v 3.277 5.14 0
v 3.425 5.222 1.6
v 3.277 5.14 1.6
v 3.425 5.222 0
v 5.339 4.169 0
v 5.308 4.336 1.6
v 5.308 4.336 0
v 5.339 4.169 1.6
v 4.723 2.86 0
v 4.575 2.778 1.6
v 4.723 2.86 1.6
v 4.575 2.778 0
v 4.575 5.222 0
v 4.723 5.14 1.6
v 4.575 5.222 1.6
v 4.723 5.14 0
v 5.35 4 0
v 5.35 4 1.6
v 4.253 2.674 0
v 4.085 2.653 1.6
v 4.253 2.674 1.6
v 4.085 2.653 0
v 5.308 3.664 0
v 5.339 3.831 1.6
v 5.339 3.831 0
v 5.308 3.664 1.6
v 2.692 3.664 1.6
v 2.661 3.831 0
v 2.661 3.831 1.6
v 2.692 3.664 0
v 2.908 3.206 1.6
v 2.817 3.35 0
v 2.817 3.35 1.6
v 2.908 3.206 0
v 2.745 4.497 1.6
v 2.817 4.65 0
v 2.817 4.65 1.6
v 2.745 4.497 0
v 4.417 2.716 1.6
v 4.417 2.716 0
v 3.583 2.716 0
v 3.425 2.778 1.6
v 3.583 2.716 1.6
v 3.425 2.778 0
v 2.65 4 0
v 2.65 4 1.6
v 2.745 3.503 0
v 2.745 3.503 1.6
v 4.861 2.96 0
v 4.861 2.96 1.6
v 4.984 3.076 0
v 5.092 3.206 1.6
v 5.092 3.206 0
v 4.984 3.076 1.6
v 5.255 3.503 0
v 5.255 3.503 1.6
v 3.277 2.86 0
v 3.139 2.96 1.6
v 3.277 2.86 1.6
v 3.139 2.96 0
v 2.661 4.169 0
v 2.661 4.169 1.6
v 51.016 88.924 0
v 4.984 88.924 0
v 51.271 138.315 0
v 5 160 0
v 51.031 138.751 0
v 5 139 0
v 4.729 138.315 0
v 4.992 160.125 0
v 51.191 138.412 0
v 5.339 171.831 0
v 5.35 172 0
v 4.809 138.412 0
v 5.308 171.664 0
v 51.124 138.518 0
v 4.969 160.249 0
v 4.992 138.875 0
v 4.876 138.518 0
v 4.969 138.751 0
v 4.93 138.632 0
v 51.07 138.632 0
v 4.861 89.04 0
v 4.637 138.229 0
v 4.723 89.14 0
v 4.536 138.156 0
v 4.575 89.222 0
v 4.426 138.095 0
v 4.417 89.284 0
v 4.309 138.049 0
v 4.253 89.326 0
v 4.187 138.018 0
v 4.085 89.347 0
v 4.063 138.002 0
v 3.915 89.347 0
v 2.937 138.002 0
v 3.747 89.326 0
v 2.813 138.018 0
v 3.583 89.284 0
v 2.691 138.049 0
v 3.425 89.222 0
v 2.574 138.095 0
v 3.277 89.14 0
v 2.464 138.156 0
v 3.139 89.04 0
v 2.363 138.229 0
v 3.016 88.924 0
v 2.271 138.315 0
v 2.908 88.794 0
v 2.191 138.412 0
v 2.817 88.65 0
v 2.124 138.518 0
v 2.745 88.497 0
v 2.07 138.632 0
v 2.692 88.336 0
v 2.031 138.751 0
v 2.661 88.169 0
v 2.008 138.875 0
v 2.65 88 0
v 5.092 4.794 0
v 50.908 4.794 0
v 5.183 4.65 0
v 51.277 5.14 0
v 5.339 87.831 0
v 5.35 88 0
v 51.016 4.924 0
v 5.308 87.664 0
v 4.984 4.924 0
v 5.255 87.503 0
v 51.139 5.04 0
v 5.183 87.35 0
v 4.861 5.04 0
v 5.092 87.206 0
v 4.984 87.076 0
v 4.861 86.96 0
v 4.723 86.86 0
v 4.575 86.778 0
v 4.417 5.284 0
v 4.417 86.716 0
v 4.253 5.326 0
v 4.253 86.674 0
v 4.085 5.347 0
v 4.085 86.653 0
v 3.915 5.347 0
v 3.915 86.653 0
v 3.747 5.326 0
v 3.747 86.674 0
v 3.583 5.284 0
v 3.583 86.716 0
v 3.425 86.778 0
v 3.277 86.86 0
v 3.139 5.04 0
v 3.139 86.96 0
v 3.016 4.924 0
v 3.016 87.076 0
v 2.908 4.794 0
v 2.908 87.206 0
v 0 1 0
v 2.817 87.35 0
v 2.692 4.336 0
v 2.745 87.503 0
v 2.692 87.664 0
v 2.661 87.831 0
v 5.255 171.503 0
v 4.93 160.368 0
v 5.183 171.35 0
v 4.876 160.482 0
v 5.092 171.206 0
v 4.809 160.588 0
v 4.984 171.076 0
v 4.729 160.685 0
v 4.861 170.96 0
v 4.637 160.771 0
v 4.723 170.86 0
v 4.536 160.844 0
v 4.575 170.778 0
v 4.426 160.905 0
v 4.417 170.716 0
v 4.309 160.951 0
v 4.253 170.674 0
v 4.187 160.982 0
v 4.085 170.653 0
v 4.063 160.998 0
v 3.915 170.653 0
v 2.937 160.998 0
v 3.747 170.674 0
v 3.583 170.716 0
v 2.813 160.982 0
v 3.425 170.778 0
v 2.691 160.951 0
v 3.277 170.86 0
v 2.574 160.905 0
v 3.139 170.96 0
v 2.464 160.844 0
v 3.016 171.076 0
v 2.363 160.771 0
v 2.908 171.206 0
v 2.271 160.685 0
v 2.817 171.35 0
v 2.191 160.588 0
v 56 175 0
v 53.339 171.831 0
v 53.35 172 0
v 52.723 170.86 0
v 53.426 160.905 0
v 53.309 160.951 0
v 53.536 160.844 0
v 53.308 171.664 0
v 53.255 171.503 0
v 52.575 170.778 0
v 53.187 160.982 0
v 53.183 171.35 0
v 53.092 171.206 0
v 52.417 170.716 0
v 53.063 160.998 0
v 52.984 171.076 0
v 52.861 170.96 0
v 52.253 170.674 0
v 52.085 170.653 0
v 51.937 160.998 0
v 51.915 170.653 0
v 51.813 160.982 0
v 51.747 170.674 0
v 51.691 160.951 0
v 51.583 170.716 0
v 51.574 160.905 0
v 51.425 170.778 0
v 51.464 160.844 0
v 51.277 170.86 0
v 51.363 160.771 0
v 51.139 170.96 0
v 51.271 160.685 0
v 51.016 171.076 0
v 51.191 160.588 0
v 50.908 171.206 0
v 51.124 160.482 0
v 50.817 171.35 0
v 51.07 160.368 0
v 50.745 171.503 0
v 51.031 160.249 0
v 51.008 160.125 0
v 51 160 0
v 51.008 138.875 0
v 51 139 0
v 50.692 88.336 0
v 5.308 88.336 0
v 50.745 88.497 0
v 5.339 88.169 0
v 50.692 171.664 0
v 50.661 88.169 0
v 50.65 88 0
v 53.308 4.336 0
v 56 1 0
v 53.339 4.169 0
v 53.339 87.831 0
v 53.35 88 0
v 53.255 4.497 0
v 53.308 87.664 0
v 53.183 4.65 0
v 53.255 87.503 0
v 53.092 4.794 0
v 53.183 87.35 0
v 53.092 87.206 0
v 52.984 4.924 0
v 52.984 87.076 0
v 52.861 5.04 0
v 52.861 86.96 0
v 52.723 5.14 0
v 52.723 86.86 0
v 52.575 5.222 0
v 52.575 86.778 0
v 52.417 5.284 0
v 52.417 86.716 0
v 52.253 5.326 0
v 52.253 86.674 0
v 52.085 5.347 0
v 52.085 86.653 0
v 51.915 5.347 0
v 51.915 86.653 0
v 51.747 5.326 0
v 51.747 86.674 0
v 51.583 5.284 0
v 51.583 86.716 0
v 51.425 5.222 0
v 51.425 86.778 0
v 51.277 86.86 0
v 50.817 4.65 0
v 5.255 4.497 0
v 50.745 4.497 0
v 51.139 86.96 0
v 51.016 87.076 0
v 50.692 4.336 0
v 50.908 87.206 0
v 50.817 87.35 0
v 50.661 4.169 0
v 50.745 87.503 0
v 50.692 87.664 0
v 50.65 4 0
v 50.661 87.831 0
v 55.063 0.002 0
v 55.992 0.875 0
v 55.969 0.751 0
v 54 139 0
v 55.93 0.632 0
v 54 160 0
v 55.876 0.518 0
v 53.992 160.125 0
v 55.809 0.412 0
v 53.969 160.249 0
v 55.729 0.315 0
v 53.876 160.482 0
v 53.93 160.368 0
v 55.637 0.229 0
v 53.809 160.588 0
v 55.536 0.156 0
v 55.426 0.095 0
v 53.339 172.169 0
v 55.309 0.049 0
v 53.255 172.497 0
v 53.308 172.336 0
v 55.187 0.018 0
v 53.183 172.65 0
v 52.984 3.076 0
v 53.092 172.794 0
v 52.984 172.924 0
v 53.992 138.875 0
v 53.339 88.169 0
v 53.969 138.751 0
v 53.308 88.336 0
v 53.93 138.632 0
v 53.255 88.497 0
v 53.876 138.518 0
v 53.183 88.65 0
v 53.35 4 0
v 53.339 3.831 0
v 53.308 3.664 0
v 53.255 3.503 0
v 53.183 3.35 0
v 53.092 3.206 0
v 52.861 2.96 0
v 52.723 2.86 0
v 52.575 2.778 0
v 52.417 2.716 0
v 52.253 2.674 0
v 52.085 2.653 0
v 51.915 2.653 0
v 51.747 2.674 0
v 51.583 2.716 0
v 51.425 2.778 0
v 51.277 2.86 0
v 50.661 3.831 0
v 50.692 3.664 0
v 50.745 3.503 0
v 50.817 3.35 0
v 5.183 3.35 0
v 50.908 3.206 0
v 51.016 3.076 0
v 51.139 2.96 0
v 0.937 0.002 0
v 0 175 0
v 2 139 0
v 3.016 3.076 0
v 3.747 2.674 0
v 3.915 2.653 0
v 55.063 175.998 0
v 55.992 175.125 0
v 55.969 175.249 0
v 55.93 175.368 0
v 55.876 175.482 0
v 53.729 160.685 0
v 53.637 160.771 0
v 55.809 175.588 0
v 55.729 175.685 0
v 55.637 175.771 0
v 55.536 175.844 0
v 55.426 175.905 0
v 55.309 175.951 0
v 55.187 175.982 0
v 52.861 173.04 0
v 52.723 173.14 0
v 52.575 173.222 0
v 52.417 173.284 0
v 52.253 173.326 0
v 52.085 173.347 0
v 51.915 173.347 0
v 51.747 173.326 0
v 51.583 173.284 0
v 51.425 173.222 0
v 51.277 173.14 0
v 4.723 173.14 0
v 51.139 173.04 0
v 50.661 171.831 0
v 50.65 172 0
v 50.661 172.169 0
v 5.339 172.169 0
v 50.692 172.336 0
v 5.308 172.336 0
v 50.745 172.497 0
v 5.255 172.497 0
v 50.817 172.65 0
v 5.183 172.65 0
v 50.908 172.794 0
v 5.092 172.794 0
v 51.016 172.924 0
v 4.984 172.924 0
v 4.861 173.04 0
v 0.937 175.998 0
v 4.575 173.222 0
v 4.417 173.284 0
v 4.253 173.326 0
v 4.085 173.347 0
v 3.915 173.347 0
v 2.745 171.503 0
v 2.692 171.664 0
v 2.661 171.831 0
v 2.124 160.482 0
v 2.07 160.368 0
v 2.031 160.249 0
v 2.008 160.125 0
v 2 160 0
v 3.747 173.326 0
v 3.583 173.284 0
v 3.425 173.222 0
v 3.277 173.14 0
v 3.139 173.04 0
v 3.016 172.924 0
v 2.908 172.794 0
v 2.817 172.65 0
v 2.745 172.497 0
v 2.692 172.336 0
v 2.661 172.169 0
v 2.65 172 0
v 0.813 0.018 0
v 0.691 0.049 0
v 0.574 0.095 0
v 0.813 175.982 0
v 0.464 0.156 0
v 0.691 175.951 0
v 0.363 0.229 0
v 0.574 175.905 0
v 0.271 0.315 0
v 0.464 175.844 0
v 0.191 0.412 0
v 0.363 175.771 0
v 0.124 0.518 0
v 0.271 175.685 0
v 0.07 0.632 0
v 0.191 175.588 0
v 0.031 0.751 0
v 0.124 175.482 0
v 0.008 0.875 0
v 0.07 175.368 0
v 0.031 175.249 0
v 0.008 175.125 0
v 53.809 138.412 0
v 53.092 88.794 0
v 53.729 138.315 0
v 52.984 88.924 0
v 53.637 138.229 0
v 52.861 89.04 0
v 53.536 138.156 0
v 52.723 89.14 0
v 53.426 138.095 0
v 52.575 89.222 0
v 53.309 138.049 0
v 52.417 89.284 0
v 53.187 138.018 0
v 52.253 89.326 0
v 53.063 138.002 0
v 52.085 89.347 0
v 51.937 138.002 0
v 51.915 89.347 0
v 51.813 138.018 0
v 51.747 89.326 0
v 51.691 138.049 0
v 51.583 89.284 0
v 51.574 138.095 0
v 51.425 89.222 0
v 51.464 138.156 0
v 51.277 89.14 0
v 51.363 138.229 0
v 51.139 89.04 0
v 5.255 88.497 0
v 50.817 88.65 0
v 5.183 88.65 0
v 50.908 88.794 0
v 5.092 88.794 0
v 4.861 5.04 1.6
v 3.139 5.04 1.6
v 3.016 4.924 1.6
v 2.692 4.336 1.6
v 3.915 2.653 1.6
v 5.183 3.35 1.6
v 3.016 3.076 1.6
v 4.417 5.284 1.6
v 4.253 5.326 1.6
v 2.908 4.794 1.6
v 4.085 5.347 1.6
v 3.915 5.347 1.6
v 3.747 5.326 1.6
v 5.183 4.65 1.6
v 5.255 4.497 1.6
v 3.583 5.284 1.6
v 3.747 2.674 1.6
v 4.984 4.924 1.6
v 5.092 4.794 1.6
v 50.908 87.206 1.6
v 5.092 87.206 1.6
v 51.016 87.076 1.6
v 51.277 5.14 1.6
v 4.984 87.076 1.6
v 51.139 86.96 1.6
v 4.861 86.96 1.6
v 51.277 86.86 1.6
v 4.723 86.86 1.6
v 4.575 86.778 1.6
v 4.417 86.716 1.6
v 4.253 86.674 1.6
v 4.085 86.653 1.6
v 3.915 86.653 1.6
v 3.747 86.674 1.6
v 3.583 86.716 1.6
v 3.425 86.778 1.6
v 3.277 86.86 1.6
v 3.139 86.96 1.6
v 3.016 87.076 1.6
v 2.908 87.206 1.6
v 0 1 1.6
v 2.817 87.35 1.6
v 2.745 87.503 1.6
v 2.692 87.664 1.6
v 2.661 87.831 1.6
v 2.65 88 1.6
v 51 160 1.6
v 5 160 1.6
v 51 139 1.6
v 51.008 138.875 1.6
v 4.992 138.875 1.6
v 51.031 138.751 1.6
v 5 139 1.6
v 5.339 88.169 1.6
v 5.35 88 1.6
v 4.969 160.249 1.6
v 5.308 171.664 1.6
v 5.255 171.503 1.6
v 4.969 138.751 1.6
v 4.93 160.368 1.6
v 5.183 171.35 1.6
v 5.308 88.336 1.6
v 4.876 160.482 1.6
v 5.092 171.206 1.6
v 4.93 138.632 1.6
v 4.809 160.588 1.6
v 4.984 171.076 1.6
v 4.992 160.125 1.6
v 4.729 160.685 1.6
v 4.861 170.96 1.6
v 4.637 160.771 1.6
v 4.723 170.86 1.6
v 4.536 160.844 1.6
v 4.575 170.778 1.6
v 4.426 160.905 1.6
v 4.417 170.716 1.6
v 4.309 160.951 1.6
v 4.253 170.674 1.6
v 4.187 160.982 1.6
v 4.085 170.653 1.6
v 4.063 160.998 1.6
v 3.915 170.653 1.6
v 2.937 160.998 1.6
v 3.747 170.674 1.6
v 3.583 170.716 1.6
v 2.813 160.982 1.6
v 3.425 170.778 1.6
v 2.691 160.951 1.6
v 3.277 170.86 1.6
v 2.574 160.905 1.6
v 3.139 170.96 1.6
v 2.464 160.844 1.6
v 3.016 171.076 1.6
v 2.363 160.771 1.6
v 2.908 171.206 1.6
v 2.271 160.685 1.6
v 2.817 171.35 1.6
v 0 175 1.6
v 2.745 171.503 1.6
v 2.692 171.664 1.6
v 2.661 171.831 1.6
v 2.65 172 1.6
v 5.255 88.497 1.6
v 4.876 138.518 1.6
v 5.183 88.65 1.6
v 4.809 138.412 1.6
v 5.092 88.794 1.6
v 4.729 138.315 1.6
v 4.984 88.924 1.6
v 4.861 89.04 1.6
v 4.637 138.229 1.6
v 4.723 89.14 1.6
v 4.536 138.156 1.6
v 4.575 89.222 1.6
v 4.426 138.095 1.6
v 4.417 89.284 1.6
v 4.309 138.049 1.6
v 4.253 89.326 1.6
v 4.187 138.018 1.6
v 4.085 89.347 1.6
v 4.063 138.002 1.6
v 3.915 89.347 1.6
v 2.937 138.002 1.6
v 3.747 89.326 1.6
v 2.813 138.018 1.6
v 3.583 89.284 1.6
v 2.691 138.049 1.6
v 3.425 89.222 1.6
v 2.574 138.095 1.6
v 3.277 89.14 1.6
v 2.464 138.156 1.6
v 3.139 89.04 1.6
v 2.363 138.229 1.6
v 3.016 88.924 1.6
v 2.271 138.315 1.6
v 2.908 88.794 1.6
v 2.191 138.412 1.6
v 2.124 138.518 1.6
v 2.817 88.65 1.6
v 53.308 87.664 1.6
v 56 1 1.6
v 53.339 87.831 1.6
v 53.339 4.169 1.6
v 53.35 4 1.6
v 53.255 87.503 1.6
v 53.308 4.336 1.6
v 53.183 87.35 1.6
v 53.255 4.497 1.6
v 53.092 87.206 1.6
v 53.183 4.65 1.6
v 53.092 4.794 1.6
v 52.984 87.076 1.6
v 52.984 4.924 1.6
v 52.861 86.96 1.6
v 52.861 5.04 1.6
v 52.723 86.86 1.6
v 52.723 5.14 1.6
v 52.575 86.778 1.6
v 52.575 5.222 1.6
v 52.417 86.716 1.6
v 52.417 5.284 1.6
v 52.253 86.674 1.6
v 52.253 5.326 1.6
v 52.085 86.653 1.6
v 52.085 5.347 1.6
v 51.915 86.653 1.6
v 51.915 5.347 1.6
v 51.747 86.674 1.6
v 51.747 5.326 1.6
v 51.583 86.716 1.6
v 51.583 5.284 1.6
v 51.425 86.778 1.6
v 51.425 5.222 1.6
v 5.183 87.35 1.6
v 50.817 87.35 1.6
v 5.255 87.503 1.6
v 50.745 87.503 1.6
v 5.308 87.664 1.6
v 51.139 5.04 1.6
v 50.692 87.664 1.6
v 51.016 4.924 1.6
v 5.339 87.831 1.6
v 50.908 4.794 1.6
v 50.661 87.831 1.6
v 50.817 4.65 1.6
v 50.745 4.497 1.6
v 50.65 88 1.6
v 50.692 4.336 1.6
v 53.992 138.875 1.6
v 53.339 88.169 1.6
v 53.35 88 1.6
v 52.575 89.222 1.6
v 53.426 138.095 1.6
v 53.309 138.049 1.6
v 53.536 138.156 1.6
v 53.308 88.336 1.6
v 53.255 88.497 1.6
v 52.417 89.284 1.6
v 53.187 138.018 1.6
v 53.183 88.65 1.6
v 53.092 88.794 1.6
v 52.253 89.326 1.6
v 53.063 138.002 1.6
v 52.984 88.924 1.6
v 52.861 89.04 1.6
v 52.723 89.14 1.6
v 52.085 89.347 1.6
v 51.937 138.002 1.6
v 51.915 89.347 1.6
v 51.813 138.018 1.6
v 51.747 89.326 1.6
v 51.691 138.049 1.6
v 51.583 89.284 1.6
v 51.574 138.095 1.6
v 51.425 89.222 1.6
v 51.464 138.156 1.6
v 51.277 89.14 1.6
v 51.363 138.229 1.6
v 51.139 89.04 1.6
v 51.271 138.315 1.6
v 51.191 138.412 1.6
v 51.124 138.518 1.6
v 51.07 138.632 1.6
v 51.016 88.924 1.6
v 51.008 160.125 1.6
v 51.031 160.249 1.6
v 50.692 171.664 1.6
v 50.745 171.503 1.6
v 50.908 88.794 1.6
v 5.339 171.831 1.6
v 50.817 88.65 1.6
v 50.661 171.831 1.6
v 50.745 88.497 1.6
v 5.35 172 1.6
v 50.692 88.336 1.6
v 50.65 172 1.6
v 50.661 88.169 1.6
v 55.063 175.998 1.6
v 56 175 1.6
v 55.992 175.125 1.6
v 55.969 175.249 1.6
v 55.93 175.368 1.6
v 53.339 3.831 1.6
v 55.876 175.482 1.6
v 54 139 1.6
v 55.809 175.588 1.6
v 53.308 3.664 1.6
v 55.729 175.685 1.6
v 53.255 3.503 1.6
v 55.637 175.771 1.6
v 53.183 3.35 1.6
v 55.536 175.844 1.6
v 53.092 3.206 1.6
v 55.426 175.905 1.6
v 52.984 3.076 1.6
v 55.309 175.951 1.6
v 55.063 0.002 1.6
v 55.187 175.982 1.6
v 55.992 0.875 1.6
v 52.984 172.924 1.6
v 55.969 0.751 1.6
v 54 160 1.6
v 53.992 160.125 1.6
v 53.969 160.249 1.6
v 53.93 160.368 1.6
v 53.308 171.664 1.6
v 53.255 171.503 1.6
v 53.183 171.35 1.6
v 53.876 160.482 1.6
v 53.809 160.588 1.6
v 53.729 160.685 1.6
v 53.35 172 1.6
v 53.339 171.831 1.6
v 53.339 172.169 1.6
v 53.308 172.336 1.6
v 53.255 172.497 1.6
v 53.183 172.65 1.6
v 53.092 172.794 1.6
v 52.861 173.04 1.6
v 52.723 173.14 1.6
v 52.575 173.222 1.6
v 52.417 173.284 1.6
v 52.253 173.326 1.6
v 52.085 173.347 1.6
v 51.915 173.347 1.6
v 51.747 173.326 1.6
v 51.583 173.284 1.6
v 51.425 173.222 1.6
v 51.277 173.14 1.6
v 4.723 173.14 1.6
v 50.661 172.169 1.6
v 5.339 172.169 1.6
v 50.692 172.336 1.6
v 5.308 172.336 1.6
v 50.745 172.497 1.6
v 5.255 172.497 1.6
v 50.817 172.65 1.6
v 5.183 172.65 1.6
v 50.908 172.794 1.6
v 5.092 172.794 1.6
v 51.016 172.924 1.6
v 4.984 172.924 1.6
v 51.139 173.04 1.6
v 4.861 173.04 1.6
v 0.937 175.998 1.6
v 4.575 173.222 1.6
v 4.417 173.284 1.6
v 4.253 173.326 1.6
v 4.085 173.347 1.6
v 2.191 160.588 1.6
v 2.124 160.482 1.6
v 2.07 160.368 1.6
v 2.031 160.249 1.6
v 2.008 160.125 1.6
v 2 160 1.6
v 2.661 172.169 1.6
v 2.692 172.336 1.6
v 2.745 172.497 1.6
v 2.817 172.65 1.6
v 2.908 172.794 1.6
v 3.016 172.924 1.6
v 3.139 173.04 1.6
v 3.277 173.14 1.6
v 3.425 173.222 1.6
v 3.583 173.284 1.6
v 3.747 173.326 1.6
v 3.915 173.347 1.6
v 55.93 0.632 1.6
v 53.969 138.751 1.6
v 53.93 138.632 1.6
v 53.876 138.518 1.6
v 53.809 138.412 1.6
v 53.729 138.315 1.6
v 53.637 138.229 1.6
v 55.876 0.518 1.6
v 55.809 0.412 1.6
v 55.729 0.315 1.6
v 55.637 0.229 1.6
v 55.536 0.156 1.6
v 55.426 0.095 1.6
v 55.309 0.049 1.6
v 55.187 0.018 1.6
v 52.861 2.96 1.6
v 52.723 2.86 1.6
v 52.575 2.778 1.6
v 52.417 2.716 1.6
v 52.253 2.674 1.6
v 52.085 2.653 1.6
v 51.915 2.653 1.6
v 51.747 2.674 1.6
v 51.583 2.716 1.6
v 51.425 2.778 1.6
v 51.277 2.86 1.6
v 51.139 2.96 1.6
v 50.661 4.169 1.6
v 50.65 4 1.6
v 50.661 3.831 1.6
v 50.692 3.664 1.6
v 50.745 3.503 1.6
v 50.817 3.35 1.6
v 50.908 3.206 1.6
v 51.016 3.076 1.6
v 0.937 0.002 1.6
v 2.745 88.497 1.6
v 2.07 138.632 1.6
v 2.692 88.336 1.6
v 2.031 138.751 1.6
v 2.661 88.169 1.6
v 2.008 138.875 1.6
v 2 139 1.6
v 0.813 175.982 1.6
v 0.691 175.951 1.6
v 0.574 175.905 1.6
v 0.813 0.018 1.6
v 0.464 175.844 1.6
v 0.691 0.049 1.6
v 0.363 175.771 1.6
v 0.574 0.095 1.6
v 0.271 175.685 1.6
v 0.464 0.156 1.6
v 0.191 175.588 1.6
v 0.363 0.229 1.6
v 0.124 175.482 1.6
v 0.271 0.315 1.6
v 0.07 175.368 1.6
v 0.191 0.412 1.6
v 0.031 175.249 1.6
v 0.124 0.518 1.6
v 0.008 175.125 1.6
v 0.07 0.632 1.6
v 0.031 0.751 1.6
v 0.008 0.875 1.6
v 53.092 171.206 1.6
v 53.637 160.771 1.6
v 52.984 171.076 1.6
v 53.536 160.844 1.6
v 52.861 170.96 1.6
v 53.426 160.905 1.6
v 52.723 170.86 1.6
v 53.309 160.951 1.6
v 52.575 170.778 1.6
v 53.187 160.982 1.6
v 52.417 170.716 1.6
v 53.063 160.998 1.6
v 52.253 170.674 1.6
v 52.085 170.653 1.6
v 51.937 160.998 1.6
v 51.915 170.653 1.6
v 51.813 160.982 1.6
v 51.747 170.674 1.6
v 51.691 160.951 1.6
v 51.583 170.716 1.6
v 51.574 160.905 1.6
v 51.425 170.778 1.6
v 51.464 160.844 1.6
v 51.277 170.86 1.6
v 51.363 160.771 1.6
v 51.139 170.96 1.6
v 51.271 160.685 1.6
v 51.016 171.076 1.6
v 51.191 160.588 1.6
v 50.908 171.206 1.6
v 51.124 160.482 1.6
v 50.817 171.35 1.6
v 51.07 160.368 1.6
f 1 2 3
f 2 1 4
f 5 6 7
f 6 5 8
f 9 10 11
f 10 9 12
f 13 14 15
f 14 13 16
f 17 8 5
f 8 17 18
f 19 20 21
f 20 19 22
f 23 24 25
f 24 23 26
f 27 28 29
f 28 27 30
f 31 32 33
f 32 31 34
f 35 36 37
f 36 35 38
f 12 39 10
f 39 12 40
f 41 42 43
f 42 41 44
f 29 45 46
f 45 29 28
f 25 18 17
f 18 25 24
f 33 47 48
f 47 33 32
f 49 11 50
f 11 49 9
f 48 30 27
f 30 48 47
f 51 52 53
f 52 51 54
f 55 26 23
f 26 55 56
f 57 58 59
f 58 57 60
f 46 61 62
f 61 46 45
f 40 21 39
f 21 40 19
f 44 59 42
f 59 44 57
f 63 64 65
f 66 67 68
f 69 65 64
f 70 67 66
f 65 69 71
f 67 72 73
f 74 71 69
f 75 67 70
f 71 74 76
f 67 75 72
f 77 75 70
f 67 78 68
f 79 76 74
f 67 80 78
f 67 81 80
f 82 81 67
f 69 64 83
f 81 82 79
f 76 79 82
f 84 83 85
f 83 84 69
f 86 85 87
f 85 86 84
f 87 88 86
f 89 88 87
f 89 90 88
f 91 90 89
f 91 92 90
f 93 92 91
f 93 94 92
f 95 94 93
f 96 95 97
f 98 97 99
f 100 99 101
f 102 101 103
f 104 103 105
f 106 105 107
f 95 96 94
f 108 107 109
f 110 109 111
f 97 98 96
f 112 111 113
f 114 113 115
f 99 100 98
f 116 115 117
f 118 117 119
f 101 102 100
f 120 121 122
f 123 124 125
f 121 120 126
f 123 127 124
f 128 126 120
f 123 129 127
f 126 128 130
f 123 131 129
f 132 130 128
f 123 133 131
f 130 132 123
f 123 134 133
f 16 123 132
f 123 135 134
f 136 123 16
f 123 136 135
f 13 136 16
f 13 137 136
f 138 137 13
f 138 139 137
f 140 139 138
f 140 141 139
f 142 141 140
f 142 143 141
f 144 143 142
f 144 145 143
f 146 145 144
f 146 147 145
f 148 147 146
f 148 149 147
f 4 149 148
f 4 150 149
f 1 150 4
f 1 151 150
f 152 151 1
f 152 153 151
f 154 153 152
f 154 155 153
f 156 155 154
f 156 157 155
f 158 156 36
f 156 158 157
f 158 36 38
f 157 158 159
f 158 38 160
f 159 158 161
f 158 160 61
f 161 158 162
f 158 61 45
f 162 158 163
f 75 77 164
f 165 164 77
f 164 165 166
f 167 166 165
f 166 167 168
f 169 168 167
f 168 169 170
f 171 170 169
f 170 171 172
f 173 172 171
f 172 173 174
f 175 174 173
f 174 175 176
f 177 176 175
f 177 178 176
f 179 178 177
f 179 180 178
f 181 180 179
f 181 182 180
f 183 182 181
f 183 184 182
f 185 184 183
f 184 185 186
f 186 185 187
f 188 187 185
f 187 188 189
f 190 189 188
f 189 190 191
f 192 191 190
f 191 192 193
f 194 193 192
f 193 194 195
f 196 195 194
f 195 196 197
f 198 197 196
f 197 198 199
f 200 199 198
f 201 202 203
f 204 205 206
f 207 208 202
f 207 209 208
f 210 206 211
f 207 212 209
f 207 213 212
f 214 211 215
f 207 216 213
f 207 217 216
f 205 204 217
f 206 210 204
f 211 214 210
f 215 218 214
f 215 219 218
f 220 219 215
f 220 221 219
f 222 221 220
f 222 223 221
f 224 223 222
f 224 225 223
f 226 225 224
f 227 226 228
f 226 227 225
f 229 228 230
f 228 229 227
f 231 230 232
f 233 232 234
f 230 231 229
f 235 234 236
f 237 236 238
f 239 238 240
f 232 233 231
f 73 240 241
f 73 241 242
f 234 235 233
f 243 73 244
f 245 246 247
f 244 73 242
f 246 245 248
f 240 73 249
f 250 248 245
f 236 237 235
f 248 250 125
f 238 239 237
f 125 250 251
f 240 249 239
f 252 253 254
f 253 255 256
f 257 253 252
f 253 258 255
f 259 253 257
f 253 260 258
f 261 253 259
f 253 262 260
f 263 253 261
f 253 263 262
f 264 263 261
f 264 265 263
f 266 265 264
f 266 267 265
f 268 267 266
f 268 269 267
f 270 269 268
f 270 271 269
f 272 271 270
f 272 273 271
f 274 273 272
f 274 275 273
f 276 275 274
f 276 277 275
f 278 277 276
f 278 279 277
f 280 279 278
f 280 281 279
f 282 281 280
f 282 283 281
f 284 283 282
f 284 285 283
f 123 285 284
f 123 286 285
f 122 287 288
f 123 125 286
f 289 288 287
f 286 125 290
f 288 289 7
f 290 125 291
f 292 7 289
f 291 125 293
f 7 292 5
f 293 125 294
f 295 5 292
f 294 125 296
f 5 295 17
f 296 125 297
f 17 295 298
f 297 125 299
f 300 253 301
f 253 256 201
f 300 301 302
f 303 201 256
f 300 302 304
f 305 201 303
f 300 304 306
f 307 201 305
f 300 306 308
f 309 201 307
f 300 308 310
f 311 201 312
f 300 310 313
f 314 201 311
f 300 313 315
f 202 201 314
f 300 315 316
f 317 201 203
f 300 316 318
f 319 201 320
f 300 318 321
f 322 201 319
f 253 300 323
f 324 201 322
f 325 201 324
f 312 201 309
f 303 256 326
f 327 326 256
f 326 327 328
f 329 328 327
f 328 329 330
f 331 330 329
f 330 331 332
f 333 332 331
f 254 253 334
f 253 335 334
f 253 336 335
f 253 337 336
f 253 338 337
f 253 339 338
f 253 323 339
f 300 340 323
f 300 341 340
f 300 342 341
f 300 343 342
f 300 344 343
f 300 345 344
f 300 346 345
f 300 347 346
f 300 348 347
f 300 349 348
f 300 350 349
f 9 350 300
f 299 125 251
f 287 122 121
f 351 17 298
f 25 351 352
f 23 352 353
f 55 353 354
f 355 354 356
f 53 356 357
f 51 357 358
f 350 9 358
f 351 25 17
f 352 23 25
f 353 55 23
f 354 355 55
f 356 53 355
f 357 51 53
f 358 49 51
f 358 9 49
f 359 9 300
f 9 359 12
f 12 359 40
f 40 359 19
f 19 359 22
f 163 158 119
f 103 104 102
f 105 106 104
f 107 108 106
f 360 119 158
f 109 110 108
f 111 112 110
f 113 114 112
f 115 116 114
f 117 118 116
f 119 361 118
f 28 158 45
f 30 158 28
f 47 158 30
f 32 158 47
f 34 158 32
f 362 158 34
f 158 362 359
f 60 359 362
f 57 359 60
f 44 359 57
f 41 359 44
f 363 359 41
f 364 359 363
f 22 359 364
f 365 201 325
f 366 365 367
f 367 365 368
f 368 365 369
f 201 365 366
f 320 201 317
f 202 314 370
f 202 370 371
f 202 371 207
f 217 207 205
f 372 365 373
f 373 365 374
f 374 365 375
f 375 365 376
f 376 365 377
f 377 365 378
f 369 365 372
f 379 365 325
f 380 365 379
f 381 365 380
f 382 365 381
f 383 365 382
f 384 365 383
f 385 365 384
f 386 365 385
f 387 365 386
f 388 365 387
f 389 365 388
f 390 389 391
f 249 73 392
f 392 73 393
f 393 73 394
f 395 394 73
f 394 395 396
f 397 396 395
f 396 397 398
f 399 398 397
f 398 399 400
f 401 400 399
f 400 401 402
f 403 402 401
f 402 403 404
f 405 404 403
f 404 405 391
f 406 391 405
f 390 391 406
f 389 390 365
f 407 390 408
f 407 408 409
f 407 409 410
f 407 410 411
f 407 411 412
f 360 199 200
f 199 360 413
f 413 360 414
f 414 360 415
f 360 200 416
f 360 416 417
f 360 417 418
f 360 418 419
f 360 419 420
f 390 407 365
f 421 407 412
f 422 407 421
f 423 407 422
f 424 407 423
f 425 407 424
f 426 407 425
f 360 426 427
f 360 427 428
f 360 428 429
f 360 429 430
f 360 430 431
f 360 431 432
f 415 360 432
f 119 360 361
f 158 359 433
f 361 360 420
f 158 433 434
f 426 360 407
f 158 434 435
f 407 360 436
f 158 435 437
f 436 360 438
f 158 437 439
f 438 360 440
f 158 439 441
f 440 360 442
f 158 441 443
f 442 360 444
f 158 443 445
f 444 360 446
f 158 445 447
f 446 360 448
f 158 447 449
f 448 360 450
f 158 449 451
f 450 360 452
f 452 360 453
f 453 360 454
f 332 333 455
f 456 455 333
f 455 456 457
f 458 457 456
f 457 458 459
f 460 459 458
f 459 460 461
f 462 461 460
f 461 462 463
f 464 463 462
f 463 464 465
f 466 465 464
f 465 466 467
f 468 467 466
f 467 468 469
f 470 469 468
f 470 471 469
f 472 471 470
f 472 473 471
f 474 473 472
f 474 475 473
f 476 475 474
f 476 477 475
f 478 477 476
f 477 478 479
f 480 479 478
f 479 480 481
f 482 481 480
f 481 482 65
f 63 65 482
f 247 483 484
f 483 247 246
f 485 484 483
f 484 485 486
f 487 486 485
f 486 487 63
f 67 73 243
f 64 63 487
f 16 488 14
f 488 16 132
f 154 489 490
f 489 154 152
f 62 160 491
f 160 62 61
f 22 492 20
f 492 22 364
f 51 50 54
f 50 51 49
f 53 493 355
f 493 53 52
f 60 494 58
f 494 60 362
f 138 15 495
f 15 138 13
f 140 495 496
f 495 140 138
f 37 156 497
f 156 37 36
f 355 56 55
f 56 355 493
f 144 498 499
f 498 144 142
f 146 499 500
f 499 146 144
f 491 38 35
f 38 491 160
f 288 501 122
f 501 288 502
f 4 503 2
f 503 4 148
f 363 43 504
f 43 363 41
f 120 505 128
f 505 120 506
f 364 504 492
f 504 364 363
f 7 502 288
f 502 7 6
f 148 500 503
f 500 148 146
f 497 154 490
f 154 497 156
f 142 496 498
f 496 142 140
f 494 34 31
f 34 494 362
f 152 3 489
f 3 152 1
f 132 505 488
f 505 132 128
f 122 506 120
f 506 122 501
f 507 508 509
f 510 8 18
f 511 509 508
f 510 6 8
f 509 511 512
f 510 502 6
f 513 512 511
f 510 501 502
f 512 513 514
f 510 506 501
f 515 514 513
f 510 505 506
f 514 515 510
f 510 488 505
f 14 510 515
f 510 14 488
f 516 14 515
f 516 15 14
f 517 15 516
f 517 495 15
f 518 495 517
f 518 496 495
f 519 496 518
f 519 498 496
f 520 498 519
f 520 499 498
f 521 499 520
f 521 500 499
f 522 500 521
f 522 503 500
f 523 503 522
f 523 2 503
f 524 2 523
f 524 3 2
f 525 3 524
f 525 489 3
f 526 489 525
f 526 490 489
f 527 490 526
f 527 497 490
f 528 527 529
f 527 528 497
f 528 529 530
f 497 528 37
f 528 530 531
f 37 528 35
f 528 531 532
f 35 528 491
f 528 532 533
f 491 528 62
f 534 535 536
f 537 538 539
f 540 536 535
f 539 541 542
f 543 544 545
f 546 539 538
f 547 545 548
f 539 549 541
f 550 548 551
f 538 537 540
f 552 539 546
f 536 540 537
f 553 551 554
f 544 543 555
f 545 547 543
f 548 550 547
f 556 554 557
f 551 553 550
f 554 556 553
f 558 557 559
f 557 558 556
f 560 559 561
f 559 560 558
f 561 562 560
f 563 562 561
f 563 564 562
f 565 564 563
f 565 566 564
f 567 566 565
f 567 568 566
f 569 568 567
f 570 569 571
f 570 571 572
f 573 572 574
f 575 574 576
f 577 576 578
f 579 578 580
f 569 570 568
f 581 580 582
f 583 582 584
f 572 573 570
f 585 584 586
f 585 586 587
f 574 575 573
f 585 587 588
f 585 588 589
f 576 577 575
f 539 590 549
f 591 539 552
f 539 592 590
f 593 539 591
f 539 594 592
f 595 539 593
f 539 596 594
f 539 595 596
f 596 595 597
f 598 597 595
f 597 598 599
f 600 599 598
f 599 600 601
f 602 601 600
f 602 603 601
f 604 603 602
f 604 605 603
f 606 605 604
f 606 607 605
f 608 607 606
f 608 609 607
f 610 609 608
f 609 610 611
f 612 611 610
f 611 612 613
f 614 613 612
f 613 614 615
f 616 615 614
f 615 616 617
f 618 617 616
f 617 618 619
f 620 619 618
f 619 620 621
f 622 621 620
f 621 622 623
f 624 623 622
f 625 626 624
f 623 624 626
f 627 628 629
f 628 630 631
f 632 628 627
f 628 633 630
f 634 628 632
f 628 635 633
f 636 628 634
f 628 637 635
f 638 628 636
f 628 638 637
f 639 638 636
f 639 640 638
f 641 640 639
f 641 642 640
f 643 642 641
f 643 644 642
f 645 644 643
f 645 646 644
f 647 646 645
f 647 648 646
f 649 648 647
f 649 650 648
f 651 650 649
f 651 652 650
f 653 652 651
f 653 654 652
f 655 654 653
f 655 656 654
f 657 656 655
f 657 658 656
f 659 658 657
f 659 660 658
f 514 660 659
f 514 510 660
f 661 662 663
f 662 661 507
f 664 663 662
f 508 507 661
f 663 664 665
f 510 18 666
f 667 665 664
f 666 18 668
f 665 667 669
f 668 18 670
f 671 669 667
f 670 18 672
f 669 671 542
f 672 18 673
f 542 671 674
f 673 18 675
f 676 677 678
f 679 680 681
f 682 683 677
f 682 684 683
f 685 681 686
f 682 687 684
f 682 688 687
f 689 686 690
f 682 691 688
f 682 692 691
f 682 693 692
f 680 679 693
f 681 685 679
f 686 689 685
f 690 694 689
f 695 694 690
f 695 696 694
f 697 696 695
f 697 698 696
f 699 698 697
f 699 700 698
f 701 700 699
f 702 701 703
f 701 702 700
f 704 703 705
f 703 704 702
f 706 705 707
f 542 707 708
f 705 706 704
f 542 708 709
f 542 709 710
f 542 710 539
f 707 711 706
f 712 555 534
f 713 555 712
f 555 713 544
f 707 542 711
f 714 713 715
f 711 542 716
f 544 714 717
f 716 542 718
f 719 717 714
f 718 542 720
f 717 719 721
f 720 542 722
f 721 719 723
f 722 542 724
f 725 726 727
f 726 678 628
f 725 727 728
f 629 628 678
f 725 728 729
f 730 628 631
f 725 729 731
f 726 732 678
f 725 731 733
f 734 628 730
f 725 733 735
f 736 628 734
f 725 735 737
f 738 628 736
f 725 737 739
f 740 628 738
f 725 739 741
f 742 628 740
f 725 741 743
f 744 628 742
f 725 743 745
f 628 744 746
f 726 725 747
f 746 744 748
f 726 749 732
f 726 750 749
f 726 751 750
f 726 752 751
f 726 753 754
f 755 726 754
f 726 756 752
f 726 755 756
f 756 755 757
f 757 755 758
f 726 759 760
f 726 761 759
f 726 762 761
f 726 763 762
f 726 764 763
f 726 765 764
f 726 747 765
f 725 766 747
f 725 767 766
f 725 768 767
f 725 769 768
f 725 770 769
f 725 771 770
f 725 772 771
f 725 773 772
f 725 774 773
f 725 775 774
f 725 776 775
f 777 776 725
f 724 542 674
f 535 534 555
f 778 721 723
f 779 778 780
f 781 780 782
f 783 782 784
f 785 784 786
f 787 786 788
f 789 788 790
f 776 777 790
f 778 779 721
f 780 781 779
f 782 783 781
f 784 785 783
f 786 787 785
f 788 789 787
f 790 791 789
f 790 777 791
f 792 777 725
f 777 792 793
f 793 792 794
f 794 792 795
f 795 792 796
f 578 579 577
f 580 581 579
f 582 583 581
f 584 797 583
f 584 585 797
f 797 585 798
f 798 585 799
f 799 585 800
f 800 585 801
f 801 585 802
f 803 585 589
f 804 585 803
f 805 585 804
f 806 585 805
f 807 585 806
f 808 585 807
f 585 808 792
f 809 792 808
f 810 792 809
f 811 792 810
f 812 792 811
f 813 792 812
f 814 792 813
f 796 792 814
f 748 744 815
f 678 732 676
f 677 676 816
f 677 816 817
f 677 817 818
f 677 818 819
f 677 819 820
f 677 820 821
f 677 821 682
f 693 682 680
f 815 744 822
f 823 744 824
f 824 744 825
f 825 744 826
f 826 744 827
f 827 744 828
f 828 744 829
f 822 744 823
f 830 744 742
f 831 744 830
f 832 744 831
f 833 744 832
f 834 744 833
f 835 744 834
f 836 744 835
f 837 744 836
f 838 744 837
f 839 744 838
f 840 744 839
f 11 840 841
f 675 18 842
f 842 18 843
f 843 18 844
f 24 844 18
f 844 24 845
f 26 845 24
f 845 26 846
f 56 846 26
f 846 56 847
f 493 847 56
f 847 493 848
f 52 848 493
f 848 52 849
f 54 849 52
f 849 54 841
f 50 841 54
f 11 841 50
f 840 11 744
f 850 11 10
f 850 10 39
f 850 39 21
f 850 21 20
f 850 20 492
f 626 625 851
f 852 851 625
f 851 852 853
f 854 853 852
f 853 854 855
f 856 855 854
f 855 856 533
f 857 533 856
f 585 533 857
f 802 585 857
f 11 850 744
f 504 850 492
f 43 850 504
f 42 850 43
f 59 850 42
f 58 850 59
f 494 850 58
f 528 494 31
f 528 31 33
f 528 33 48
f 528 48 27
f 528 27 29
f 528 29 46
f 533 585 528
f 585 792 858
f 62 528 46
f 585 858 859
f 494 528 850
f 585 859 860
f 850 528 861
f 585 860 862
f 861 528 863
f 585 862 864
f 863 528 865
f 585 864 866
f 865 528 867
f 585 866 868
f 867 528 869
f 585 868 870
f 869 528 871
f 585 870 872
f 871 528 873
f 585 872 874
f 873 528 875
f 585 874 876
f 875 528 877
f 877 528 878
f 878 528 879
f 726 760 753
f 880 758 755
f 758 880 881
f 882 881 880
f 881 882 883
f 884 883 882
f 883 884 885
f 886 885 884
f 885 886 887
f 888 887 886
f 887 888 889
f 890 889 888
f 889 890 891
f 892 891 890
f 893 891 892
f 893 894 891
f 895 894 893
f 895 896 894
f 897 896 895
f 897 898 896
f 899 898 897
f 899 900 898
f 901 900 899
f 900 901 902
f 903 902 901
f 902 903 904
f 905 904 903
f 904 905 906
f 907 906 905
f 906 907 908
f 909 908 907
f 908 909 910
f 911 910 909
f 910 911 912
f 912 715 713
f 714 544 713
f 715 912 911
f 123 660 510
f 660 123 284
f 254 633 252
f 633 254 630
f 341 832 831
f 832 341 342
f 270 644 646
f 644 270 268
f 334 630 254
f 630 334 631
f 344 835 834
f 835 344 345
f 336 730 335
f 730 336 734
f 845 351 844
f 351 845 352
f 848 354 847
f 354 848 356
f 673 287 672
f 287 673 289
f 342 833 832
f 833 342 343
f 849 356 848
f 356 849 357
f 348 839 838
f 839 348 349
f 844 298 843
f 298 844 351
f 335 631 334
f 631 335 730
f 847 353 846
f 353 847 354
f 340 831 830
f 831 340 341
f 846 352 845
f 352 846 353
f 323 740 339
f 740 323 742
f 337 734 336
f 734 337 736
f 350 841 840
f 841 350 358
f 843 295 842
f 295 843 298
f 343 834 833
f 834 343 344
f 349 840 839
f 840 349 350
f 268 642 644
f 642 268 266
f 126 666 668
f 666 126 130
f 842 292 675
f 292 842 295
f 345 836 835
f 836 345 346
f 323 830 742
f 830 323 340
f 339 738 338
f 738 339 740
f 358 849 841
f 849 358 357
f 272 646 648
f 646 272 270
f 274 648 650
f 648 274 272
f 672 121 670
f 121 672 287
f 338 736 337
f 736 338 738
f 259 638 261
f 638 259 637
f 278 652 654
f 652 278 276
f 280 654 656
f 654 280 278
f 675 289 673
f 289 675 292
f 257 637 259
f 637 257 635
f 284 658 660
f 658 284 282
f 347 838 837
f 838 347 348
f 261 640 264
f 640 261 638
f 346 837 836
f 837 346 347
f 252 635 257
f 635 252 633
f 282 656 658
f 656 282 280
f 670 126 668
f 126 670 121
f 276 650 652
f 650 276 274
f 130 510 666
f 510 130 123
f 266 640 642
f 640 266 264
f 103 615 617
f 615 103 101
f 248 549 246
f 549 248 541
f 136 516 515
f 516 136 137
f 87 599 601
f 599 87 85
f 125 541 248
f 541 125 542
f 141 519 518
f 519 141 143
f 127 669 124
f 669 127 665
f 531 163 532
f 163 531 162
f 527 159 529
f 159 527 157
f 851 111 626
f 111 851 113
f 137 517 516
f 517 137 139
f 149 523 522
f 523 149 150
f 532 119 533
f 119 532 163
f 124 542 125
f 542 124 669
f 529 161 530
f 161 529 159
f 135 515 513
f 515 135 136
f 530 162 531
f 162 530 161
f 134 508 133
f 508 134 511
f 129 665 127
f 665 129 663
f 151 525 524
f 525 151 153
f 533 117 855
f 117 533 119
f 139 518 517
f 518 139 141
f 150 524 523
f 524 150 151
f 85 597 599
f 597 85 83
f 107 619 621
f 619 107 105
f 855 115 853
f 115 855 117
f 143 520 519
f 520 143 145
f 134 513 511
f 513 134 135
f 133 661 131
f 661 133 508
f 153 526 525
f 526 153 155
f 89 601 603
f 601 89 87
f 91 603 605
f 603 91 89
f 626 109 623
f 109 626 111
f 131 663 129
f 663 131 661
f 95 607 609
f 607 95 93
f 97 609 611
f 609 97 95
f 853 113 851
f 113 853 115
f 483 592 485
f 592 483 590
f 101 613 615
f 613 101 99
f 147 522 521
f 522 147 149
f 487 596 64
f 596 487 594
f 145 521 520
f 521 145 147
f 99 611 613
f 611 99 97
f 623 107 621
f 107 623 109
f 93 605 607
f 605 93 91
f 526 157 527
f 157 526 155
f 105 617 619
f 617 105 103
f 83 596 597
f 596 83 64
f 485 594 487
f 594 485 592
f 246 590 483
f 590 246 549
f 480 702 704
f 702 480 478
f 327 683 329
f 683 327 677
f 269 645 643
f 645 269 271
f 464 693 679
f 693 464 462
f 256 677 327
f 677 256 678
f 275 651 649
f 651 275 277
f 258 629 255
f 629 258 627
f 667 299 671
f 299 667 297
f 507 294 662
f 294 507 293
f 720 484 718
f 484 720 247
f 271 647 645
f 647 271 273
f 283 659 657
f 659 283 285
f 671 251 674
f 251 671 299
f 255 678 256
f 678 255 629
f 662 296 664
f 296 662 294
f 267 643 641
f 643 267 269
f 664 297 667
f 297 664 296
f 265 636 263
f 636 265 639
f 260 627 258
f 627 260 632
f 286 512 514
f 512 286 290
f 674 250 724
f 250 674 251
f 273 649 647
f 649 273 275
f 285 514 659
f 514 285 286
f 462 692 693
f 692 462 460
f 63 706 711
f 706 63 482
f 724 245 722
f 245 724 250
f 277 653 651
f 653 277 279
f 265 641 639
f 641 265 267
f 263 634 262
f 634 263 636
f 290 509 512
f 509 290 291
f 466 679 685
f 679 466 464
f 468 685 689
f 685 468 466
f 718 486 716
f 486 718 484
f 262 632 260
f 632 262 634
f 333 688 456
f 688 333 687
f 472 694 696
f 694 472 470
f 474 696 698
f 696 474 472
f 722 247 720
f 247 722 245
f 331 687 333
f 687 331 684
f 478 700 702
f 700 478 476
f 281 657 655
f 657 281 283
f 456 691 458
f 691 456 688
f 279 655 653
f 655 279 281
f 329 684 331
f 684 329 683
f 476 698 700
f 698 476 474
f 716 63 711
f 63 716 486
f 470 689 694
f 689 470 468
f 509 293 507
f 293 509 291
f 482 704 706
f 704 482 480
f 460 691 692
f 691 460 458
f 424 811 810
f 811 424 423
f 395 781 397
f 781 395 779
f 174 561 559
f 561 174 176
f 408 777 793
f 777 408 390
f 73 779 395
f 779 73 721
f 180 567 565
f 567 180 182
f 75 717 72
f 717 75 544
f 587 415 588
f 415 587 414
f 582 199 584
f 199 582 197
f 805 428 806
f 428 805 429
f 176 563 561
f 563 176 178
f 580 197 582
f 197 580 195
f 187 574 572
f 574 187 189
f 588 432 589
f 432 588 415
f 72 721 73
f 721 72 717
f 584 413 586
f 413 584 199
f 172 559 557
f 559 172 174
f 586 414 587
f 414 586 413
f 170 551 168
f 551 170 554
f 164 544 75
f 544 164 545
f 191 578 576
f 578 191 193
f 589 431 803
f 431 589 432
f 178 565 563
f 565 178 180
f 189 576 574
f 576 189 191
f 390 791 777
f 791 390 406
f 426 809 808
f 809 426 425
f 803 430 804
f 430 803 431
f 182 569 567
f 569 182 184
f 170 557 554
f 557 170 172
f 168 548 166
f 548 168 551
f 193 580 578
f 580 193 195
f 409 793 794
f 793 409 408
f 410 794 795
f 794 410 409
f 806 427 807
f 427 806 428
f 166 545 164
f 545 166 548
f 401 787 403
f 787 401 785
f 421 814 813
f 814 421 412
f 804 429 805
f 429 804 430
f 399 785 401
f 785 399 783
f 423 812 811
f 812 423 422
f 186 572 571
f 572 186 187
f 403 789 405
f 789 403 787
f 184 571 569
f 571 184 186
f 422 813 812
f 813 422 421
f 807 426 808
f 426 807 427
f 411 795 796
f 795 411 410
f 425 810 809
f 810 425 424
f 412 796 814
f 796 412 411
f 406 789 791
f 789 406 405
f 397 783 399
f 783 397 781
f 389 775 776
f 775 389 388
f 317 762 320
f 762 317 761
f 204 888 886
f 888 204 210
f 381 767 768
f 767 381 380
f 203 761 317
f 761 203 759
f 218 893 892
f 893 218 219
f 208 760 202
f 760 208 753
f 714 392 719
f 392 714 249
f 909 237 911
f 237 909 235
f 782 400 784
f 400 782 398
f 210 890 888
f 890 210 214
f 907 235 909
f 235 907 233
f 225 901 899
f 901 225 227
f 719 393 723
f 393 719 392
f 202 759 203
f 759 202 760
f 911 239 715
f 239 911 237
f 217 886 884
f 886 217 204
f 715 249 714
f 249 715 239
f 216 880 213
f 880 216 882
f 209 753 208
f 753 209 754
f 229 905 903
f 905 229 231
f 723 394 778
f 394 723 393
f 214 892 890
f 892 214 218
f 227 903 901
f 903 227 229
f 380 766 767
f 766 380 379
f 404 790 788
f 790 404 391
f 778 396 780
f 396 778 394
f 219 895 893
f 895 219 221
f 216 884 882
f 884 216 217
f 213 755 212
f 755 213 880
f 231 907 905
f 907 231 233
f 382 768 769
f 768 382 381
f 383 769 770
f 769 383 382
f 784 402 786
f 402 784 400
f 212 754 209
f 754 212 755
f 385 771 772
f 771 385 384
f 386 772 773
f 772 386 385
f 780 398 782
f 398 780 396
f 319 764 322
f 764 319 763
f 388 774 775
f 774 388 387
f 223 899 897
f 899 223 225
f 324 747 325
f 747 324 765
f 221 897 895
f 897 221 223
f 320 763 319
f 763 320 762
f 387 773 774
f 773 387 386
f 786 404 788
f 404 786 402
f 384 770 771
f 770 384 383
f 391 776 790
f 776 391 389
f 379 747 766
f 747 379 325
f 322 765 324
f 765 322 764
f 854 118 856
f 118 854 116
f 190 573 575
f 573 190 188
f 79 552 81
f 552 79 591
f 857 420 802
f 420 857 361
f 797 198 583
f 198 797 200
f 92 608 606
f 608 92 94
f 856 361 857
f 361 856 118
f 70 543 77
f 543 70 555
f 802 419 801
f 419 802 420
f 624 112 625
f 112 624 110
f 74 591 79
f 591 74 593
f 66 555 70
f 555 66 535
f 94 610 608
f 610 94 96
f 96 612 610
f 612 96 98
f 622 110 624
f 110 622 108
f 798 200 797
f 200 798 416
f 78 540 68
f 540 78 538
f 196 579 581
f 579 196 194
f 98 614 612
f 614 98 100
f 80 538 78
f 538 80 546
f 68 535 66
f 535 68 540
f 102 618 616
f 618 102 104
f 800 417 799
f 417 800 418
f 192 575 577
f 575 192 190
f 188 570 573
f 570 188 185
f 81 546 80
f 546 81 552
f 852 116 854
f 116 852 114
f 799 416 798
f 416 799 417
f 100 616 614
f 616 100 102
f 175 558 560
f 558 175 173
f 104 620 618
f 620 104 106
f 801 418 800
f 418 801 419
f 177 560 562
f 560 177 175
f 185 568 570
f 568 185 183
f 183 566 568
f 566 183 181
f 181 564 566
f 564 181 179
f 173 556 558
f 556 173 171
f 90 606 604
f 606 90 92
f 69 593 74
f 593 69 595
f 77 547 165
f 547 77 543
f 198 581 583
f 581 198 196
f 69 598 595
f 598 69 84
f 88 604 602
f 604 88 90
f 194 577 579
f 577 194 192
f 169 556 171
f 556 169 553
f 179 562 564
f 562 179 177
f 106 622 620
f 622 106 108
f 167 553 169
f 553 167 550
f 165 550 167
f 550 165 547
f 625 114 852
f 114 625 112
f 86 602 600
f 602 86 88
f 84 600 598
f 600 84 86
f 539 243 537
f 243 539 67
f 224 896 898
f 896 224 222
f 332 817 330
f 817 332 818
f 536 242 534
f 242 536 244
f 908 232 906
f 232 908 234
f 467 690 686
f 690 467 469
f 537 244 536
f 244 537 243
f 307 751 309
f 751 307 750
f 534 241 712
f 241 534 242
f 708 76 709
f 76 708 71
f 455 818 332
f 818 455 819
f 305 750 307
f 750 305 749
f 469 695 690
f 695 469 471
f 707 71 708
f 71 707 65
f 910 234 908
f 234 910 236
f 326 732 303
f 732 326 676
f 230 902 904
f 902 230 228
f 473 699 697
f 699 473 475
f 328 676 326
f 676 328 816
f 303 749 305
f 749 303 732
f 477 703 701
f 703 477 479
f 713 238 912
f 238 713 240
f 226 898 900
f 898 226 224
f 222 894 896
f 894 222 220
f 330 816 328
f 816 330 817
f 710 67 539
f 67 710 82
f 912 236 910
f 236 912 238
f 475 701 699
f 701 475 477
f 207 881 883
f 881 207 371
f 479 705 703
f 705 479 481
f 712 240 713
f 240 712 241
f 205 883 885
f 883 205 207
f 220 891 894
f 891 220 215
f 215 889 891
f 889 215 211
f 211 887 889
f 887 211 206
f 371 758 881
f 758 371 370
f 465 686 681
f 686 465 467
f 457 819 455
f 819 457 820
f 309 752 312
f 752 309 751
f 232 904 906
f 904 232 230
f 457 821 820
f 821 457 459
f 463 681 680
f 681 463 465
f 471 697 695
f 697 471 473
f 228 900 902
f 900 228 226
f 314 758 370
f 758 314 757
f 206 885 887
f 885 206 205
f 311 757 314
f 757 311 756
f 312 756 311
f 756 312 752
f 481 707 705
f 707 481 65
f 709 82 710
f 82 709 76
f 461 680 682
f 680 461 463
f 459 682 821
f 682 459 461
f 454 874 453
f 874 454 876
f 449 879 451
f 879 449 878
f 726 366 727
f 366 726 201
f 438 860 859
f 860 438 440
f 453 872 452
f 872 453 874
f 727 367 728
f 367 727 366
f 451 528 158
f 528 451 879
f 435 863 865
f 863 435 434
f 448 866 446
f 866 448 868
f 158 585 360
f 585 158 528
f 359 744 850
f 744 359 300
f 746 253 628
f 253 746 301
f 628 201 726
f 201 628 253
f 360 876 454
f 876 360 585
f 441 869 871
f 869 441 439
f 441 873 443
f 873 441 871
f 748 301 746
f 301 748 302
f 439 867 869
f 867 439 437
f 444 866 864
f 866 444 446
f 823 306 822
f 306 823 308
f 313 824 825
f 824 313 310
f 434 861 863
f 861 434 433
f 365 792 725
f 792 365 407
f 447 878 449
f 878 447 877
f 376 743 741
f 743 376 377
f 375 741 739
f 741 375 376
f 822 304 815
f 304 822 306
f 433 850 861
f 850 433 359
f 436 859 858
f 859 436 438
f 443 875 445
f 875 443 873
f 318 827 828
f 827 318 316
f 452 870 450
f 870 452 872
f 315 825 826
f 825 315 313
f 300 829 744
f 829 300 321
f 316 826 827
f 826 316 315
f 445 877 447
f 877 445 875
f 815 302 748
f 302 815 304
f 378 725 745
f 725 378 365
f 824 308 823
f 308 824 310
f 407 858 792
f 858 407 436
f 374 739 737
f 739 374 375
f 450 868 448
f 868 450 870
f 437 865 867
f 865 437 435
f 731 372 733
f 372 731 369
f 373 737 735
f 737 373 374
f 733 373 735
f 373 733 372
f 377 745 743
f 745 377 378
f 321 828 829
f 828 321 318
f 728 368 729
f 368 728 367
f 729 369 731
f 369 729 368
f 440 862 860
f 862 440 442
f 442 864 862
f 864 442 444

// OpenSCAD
// file: ../common/module-common-routines.scad
include <./shared-variables.scad>
use <../common/shared-utils.scad>

function get_module_size(width_units) =
    [
        width_units * module_width_x_unit,
        module_height_y * 1
    ];

function get_pcb_size(width_units) =
let (xy = get_module_size(width_units))
    [
        xy.x - (outer_wall_thickness_base * 2),
        xy.y - (outer_wall_thickness_base * 2)
    ];


module magnet_hole_cutouts(module_size) {
    x_inset = module_width_x_unit / 2;
    y_inset = magnet_inset;

    points = [
            [x_inset, y_inset],
            [module_size.x - x_inset, y_inset],
            [x_inset, module_size.y - y_inset],
            [module_size.x - x_inset, module_size.y - y_inset]
        ];

    for (p = points) {
        translate(p) {
            magnet_hole_cutout();
        }
    }
}

module magnet_hole_cutout() {
    linear_extrude(magnet_depth) {
        circle(d = magnet_diameter);
    }
}
// file: ../common/shared-variables.scad
$fn = 50;

u_1 = 19.05;

plate_corner_radius = 2;

screw_hole_diameter = 2.7;

switch_neck_thickness = 1.2;
switch_neck_width = 13.9;
switch_hole_width = switch_neck_width + 2;

encoder_width = 17;
encoder_height = 14;

magnet_diameter = 5 + 0.3;
magnet_depth = 2 + 0.2;
magnet_inset = 5;

module_width_x_unit = 20;
module_height_y = 180;

module_bottom_base_thickness = 4;

pcb_thickness = 1.6;

wall_tolerance = 0.5;
outer_wall_thickness_base = 2;
outer_wall_thickness = outer_wall_thickness_base - (wall_tolerance / 2);
inner_wall_thickness = 2;

inner_wall_height = 3;
outer_wall_height = inner_wall_height + pcb_thickness;

screw_hole_inset_pcb = 4;
screw_hole_inset = screw_hole_inset_pcb + outer_wall_thickness_base;

threaded_insert_towers_diameter = 5;
threaded_insert_towers_radius = threaded_insert_towers_diameter / 2;

threaded_insert_length = 4;
threaded_insert_knurl_diameter = 3;

side_connector_height = 4.7;
side_connector_length = 23;
side_connector_offset = 40;

back_connector_height = 5;
back_connector_offset = 15;

bottom_module_base_cutout_inset_x = 10;
bottom_module_base_cutout_inset_y = 10;

module_top_thickness = 2;

module_total_height = module_bottom_base_thickness + outer_wall_height + module_top_thickness;
// file: ../common/shared-utils.scad
module rounded_rectangle(size, corner_radius, center = false) {

    x_offset = center ? -size.x / 2 : 0;
    y_offset = center ? -size.y / 2 : 0;

    corners_points = [
            [corner_radius, corner_radius],
            [size.x - corner_radius, corner_radius],
            [size.x - corner_radius, size.y - corner_radius],
            [corner_radius, size.y - corner_radius],
        ];

    hull() {
        for (p = corners_points) {
            translate([p.x + x_offset, p.y + y_offset, -1])
                circle(corner_radius);
        }
    }
}


module circle_segment(radius, cut_off_height) {
    intersection() {
        translate([0, -cut_off_height]) {
            circle(radius);
        }
        translate([-radius, 0]) {
            square([radius * 2, cut_off_height * 2]);
        }
    }
}

module tear_drop_circle(d) {
    r = d / 2;
    angle = 30;
    offset_y = r / 2;
    offset_x = cos(angle) * r;

    triangle_points = [
            [-offset_x, r / 2],
            [offset_x, r / 2],
            [0, 3 / 2 * r]
        ];

    polygon(triangle_points);
    circle(d = d);

}
// file: ../common/module-bottom-routines.scad
include <./module-common-routines.scad>
include <./shared-variables.scad>
use <./shared-utils.scad>

module module_bottom_base(width_units) {
    module_size = get_module_size(width_units);

    intersection() {
        module_bottom_bounding_box(module_size);

        difference() {
            union() {
                module_bottom_base_base(module_size);
                module_bottom_base_walls(module_size);
                heat_inset_mounts(module_size);
            }

            union() {
                magnet_hole_cutouts(module_size);
                threaded_insert_cutouts(module_size);
                side_connector_cutouts(module_size);
                back_connector_cutouts(module_size);
                module_bottom_base_cutout(module_size);
            }
        }
    }
}

module module_bottom_base_base(module_size) {
    linear_extrude(module_bottom_base_thickness) {
        rounded_rectangle(module_size, 1);
    }
}

module module_bottom_base_walls(module_size) {
    translate([0, 0, module_bottom_base_thickness]) {
        difference() {
            linear_extrude(outer_wall_height) {
                rounded_rectangle(module_size, 1);
            }

            linear_extrude(outer_wall_height) {
                translate([outer_wall_thickness, outer_wall_thickness]) {
                    x = module_size.x - (outer_wall_thickness * 2);
                    y = module_size.y - (outer_wall_thickness * 2);
                    rounded_rectangle([x, y], 1);
                }
            }
        }

        difference() {
            linear_extrude(inner_wall_height) {
                translate([outer_wall_thickness, outer_wall_thickness]) {
                    x = module_size.x - (outer_wall_thickness * 2);
                    y = module_size.y - (outer_wall_thickness * 2);
                    rounded_rectangle([x, y], 1);
                }
            }

            linear_extrude(inner_wall_height) {
                translate([outer_wall_thickness + inner_wall_thickness, outer_wall_thickness + inner_wall_thickness]) {
                    x = module_size.x - (outer_wall_thickness * 2) - (inner_wall_thickness * 2);
                    y = module_size.y - (outer_wall_thickness * 2) - (inner_wall_thickness * 2);
                    rounded_rectangle([x, y], 1);
                }
            }
        }
    }
}

module module_bottom_base_cutout(module_size) {
    inset = [
        bottom_module_base_cutout_inset_x,
        bottom_module_base_cutout_inset_y
        ];

    linear_extrude(module_bottom_base_thickness + outer_wall_height) {
        translate(inset) {
            rounded_rectangle([
                    module_size.x - (inset.x * 2),
                    module_size.y - (inset.y * 2)
                ], 1);
        }
    }
}

module module_bottom_bounding_box(module_size) {
    linear_extrude(module_bottom_base_thickness + outer_wall_height) {
        rounded_rectangle(module_size, 1);
    }
}

module heat_inset_mounts(module_size) {
    points = get_module_bottom_screw_hole_points(module_size);

    translate([0, 0, module_bottom_base_thickness]) {
        for (p = points) {
            translate(p) {
                heat_inset_mount();
            }
        }
    }
}

module heat_inset_mount() {
    difference() {
        cylinder(h = inner_wall_height, d1 = threaded_insert_towers_diameter * 2, d2 = threaded_insert_towers_diameter);
    }
}

module threaded_insert_cutouts(module_size) {
    points = get_module_bottom_screw_hole_points(module_size);

    translate([0, 0, module_bottom_base_thickness]) {
        for (p = points) {
            translate(p) {
                threaded_insert_cutout();
            }
        }
    }
}

module threaded_insert_cutout() {
    k = threaded_insert_knurl_diameter;
    l = threaded_insert_length;

    k1 = k + 0.2;
    k2 = k * 0.9;

    l1 = l * 0.25;
    l2 = l + 1;

    translate([0, 0, inner_wall_height - l1]) {
        linear_extrude(l1) {
            circle(d = k1);
        }
    }

    translate([0, 0, inner_wall_height - l2]) {
        linear_extrude(l2) {
            circle(d = k2);
        }
    }
}

module side_connector_cutouts(module_size) {
    wall_diff = outer_wall_height - inner_wall_height;

    z = module_bottom_base_thickness + outer_wall_height - side_connector_height - wall_diff;
    y = module_size.y - side_connector_offset;

    translate([0, y, z]) {
        linear_extrude(side_connector_height + wall_diff) {
            square([module_size.x, side_connector_length]);
        }
    }
}

module back_connector_cutouts(module_size) {
    wall_diff = outer_wall_height - inner_wall_height;

    y = module_size.y - bottom_module_base_cutout_inset_y - 1;
    z = module_bottom_base_thickness + outer_wall_height - back_connector_height - wall_diff;

    translate([back_connector_offset, y, z]) {
        linear_extrude(back_connector_height + wall_diff) {
            width_x = module_size.x - (back_connector_offset * 2);
            depth_y = bottom_module_base_cutout_inset_y + 1;
            square([width_x, depth_y]);
        }
    }
}

function get_module_bottom_screw_hole_points(module_size) = [
        [screw_hole_inset, screw_hole_inset],
        [module_size.x - screw_hole_inset, screw_hole_inset],
        [screw_hole_inset, module_size.y / 2],
        [module_size.x - screw_hole_inset, module_size.y / 2],
        [screw_hole_inset, module_size.y - screw_hole_inset],
        [module_size.x - screw_hole_inset, module_size.y - screw_hole_inset]
    ];
// main file
use <../common/module-bottom-routines.scad>
use <../common/shared-utils.scad>
include <../common/shared-variables.scad>

pcb_standin(3);

module pcb_standin(width_units) {
    pcb_size = get_pcb_size(width_units);

    difference() {
        // body
        linear_extrude(pcb_thickness) {
            rounded_rectangle(pcb_size, 1);
        }

        union() {
            screw_hole_cutouts(pcb_size);
            side_connector_cutouts(pcb_size);
        }
    }
}

module screw_hole_cutouts(pcb_size) {
    inset = screw_hole_inset_pcb;

    points = [
            [inset, inset],
            [pcb_size.x - inset, inset],
            [inset, pcb_size.y / 2],
            [pcb_size.x - inset, pcb_size.y / 2],
            [inset, pcb_size.y - inset],
            [pcb_size.x - inset, pcb_size.y - inset]
        ];

    for (p = points) {
        translate(p) {
            linear_extrude(pcb_thickness) {
                circle(d = screw_hole_diameter);
            }
        }
    }
}

module side_connector_cutouts(pcb_size) {
    w = 3;
    x1 = 2;
    x2 = pcb_size.x - x1 - w;
    y = pcb_size.y - side_connector_offset + outer_wall_thickness_base;

    translate([x1, y]) {
        linear_extrude(pcb_thickness) {
            rounded_rectangle([w, side_connector_length], 1);
        }
    }

    translate([x2, y]) {
        linear_extrude(pcb_thickness) {
            rounded_rectangle([w, side_connector_length], 1);
        }
    }
}
